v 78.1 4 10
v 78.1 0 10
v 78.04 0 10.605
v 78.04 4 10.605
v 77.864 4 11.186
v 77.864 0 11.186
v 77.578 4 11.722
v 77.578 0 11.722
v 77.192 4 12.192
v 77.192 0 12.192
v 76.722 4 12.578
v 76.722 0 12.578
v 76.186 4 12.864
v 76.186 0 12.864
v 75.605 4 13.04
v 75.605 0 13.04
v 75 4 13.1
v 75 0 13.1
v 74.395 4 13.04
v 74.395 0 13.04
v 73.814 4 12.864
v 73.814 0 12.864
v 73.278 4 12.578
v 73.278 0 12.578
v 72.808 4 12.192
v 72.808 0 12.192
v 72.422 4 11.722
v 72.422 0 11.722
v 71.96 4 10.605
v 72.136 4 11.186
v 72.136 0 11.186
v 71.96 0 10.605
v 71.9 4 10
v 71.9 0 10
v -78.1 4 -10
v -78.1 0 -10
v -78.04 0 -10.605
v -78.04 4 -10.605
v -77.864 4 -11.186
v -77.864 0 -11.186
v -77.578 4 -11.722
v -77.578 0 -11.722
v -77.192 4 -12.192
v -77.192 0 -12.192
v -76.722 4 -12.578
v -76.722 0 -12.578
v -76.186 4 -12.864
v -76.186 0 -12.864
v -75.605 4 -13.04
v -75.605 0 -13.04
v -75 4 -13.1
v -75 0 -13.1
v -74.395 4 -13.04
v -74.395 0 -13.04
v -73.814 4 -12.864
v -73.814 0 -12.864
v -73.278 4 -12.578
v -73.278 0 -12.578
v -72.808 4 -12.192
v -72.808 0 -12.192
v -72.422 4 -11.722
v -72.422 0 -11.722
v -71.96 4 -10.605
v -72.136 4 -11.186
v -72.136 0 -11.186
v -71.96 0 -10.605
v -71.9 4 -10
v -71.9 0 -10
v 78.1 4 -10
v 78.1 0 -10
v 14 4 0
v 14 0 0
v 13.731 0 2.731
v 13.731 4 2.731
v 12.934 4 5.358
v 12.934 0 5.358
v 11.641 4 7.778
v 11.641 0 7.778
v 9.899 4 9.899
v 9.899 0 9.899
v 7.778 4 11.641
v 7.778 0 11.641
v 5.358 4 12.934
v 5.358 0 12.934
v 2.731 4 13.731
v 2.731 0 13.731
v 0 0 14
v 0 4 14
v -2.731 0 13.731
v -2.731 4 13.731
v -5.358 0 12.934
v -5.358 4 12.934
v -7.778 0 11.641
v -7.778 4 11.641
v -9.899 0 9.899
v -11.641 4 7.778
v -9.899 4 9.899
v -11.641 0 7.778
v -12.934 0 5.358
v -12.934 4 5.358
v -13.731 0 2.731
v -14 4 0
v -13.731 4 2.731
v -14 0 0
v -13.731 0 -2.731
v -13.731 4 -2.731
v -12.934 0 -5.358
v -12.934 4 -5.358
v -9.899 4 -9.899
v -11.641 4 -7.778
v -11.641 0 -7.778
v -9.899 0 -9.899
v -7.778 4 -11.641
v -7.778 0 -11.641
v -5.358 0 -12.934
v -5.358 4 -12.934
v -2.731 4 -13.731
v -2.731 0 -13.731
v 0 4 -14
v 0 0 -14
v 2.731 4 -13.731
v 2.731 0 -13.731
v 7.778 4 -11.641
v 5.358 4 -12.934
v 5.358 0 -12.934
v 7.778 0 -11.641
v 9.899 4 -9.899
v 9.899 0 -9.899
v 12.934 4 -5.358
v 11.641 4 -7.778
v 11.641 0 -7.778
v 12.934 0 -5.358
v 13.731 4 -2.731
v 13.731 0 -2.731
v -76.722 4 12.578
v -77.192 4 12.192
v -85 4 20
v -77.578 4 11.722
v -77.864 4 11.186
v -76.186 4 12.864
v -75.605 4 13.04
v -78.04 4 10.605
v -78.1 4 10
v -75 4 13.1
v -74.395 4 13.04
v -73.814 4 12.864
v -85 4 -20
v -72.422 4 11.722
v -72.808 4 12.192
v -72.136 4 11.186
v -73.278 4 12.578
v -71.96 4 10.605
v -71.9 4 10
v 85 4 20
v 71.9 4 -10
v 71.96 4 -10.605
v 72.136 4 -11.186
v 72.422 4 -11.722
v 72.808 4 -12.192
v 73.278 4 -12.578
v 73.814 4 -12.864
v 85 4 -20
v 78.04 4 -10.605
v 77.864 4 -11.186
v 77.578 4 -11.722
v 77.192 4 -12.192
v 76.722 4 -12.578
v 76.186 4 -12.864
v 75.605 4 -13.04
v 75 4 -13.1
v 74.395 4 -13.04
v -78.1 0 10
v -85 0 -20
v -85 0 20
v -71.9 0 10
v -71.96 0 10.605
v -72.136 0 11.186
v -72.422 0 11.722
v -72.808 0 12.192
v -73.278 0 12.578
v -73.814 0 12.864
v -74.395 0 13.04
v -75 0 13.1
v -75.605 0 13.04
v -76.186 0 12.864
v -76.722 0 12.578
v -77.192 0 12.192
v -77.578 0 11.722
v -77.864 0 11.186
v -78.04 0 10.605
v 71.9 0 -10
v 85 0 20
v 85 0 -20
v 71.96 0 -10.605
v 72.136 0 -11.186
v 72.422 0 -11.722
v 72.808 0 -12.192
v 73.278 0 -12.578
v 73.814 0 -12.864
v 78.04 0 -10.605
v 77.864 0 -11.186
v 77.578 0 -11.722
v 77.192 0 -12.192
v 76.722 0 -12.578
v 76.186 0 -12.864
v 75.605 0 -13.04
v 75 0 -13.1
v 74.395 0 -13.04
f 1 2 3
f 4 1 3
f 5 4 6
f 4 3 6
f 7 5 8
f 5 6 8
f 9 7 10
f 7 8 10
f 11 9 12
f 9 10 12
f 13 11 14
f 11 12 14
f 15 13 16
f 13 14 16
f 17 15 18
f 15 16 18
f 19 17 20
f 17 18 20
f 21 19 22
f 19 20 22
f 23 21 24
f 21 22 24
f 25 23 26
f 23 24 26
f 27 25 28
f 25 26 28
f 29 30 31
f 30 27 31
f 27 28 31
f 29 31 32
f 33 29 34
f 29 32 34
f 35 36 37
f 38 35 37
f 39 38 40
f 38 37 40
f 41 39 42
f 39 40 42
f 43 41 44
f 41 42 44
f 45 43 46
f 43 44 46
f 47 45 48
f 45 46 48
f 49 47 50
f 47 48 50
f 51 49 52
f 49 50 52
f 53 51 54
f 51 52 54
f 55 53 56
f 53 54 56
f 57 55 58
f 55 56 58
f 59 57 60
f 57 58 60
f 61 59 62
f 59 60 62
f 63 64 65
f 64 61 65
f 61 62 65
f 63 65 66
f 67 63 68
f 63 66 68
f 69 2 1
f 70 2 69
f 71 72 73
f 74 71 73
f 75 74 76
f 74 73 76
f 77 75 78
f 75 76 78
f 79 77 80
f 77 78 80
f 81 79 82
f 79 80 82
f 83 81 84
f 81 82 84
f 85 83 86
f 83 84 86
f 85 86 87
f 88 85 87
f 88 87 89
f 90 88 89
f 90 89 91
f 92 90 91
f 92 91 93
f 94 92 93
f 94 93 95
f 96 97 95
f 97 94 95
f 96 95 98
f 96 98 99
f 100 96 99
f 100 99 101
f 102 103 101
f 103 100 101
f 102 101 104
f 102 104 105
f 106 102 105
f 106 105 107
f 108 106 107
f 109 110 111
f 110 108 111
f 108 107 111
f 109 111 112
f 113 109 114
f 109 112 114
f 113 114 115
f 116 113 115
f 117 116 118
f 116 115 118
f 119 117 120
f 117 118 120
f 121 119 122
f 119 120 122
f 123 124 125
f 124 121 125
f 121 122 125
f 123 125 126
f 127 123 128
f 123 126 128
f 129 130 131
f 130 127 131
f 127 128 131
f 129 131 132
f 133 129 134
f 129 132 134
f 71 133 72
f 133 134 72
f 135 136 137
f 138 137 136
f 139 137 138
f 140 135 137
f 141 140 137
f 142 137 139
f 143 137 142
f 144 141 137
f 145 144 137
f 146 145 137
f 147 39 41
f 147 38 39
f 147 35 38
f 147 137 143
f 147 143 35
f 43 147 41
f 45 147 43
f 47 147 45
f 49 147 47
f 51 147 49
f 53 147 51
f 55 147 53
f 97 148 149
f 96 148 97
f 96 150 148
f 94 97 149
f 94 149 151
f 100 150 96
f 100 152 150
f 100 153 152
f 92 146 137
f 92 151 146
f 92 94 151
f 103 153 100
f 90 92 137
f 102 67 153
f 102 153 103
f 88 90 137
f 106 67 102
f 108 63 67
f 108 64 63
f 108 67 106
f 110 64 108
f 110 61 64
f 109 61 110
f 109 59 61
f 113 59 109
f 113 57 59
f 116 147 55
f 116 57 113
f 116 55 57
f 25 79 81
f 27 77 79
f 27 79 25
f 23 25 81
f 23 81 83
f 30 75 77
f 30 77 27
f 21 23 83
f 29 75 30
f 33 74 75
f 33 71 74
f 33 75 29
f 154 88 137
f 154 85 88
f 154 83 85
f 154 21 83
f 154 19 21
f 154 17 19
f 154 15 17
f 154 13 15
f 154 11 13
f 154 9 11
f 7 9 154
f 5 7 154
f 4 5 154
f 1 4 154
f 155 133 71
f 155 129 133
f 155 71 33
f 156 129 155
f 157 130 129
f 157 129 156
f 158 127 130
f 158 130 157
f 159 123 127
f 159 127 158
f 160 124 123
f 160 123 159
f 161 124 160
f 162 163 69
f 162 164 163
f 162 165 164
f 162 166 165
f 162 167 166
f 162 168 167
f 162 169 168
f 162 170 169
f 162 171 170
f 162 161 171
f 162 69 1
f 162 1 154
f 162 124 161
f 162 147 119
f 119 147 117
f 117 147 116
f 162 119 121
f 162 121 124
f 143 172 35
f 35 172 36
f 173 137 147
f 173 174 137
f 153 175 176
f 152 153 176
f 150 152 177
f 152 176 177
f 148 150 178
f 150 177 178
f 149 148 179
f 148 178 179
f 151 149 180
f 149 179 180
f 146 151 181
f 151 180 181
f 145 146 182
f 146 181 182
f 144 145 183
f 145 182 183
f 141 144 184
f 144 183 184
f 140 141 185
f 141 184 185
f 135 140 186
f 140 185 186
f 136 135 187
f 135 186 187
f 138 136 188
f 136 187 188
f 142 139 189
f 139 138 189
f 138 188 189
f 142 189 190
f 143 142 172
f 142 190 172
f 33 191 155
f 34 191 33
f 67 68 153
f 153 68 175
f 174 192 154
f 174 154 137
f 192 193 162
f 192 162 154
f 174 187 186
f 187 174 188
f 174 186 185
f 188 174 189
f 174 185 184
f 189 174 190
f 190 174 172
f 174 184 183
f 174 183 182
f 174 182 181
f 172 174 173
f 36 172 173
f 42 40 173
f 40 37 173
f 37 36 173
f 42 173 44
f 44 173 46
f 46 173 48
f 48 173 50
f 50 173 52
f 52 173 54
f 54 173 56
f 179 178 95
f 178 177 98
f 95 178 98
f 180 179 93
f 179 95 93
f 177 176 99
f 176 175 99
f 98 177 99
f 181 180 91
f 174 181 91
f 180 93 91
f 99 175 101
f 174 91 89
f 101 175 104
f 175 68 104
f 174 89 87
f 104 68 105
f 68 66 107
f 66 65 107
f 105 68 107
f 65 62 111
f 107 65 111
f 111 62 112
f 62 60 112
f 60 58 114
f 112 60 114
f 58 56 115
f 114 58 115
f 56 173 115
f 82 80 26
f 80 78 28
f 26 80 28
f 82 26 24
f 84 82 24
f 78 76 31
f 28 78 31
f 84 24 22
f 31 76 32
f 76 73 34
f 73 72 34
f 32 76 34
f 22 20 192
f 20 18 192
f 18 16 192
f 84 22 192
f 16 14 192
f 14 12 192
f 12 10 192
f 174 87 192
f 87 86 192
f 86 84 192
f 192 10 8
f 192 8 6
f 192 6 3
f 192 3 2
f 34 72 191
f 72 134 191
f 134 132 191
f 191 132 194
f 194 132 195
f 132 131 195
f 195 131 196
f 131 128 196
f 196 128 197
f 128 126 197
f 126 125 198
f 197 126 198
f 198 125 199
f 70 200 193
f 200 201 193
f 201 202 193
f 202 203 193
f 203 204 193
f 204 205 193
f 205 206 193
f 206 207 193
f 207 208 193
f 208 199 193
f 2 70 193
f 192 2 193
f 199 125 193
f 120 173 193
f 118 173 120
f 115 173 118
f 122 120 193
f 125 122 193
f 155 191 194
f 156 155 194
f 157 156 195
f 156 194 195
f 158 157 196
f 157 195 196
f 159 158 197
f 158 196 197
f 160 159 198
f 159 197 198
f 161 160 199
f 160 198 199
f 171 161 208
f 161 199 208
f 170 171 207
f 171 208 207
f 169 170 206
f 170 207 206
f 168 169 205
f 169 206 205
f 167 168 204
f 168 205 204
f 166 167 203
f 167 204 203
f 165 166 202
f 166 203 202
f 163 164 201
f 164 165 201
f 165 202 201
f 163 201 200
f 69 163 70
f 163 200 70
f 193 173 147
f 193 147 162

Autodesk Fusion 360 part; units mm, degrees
sketch "Sketch1" plane through (0, 0, 0) normal (0, 1, 0) x (1, 0, 0)
  line L0 (85, -20) -> (-85, -20)
  line L1 (-85, -20) -> (-85, 20)
  line L2 (-85, 20) -> (85, 20)
  line L3 (85, 20) -> (85, -20)
  circle A0 centre (0, 0) radius 14
  line L4 (71.9, 10) -> (71.9, -10)
  arc A1 (71.9, -10) -> (78.1, -10) centre (75, -10) ccw
  line L5 (78.1, -10) -> (78.1, 10)
  arc A2 (78.1, 10) -> (71.9, 10) centre (75, 10) ccw
  line L6 (-71.9, 10) -> (-71.9, -10)
  arc A3 (-71.9, 10) -> (-78.1, 10) centre (-75, 10) ccw
  line L7 (-78.1, -10) -> (-78.1, 10)
  arc A4 (-78.1, -10) -> (-71.9, -10) centre (-75, -10) ccw
  dimension "d1" = 170
  dimension "d2" = 40
  dimension "d4" = 28
  dimension "d7" = 20
  dimension "d10" = 6.2
  dimension "d11" = 150
extrude "Extrude1" add sketch "Sketch1" along normal blind 4
